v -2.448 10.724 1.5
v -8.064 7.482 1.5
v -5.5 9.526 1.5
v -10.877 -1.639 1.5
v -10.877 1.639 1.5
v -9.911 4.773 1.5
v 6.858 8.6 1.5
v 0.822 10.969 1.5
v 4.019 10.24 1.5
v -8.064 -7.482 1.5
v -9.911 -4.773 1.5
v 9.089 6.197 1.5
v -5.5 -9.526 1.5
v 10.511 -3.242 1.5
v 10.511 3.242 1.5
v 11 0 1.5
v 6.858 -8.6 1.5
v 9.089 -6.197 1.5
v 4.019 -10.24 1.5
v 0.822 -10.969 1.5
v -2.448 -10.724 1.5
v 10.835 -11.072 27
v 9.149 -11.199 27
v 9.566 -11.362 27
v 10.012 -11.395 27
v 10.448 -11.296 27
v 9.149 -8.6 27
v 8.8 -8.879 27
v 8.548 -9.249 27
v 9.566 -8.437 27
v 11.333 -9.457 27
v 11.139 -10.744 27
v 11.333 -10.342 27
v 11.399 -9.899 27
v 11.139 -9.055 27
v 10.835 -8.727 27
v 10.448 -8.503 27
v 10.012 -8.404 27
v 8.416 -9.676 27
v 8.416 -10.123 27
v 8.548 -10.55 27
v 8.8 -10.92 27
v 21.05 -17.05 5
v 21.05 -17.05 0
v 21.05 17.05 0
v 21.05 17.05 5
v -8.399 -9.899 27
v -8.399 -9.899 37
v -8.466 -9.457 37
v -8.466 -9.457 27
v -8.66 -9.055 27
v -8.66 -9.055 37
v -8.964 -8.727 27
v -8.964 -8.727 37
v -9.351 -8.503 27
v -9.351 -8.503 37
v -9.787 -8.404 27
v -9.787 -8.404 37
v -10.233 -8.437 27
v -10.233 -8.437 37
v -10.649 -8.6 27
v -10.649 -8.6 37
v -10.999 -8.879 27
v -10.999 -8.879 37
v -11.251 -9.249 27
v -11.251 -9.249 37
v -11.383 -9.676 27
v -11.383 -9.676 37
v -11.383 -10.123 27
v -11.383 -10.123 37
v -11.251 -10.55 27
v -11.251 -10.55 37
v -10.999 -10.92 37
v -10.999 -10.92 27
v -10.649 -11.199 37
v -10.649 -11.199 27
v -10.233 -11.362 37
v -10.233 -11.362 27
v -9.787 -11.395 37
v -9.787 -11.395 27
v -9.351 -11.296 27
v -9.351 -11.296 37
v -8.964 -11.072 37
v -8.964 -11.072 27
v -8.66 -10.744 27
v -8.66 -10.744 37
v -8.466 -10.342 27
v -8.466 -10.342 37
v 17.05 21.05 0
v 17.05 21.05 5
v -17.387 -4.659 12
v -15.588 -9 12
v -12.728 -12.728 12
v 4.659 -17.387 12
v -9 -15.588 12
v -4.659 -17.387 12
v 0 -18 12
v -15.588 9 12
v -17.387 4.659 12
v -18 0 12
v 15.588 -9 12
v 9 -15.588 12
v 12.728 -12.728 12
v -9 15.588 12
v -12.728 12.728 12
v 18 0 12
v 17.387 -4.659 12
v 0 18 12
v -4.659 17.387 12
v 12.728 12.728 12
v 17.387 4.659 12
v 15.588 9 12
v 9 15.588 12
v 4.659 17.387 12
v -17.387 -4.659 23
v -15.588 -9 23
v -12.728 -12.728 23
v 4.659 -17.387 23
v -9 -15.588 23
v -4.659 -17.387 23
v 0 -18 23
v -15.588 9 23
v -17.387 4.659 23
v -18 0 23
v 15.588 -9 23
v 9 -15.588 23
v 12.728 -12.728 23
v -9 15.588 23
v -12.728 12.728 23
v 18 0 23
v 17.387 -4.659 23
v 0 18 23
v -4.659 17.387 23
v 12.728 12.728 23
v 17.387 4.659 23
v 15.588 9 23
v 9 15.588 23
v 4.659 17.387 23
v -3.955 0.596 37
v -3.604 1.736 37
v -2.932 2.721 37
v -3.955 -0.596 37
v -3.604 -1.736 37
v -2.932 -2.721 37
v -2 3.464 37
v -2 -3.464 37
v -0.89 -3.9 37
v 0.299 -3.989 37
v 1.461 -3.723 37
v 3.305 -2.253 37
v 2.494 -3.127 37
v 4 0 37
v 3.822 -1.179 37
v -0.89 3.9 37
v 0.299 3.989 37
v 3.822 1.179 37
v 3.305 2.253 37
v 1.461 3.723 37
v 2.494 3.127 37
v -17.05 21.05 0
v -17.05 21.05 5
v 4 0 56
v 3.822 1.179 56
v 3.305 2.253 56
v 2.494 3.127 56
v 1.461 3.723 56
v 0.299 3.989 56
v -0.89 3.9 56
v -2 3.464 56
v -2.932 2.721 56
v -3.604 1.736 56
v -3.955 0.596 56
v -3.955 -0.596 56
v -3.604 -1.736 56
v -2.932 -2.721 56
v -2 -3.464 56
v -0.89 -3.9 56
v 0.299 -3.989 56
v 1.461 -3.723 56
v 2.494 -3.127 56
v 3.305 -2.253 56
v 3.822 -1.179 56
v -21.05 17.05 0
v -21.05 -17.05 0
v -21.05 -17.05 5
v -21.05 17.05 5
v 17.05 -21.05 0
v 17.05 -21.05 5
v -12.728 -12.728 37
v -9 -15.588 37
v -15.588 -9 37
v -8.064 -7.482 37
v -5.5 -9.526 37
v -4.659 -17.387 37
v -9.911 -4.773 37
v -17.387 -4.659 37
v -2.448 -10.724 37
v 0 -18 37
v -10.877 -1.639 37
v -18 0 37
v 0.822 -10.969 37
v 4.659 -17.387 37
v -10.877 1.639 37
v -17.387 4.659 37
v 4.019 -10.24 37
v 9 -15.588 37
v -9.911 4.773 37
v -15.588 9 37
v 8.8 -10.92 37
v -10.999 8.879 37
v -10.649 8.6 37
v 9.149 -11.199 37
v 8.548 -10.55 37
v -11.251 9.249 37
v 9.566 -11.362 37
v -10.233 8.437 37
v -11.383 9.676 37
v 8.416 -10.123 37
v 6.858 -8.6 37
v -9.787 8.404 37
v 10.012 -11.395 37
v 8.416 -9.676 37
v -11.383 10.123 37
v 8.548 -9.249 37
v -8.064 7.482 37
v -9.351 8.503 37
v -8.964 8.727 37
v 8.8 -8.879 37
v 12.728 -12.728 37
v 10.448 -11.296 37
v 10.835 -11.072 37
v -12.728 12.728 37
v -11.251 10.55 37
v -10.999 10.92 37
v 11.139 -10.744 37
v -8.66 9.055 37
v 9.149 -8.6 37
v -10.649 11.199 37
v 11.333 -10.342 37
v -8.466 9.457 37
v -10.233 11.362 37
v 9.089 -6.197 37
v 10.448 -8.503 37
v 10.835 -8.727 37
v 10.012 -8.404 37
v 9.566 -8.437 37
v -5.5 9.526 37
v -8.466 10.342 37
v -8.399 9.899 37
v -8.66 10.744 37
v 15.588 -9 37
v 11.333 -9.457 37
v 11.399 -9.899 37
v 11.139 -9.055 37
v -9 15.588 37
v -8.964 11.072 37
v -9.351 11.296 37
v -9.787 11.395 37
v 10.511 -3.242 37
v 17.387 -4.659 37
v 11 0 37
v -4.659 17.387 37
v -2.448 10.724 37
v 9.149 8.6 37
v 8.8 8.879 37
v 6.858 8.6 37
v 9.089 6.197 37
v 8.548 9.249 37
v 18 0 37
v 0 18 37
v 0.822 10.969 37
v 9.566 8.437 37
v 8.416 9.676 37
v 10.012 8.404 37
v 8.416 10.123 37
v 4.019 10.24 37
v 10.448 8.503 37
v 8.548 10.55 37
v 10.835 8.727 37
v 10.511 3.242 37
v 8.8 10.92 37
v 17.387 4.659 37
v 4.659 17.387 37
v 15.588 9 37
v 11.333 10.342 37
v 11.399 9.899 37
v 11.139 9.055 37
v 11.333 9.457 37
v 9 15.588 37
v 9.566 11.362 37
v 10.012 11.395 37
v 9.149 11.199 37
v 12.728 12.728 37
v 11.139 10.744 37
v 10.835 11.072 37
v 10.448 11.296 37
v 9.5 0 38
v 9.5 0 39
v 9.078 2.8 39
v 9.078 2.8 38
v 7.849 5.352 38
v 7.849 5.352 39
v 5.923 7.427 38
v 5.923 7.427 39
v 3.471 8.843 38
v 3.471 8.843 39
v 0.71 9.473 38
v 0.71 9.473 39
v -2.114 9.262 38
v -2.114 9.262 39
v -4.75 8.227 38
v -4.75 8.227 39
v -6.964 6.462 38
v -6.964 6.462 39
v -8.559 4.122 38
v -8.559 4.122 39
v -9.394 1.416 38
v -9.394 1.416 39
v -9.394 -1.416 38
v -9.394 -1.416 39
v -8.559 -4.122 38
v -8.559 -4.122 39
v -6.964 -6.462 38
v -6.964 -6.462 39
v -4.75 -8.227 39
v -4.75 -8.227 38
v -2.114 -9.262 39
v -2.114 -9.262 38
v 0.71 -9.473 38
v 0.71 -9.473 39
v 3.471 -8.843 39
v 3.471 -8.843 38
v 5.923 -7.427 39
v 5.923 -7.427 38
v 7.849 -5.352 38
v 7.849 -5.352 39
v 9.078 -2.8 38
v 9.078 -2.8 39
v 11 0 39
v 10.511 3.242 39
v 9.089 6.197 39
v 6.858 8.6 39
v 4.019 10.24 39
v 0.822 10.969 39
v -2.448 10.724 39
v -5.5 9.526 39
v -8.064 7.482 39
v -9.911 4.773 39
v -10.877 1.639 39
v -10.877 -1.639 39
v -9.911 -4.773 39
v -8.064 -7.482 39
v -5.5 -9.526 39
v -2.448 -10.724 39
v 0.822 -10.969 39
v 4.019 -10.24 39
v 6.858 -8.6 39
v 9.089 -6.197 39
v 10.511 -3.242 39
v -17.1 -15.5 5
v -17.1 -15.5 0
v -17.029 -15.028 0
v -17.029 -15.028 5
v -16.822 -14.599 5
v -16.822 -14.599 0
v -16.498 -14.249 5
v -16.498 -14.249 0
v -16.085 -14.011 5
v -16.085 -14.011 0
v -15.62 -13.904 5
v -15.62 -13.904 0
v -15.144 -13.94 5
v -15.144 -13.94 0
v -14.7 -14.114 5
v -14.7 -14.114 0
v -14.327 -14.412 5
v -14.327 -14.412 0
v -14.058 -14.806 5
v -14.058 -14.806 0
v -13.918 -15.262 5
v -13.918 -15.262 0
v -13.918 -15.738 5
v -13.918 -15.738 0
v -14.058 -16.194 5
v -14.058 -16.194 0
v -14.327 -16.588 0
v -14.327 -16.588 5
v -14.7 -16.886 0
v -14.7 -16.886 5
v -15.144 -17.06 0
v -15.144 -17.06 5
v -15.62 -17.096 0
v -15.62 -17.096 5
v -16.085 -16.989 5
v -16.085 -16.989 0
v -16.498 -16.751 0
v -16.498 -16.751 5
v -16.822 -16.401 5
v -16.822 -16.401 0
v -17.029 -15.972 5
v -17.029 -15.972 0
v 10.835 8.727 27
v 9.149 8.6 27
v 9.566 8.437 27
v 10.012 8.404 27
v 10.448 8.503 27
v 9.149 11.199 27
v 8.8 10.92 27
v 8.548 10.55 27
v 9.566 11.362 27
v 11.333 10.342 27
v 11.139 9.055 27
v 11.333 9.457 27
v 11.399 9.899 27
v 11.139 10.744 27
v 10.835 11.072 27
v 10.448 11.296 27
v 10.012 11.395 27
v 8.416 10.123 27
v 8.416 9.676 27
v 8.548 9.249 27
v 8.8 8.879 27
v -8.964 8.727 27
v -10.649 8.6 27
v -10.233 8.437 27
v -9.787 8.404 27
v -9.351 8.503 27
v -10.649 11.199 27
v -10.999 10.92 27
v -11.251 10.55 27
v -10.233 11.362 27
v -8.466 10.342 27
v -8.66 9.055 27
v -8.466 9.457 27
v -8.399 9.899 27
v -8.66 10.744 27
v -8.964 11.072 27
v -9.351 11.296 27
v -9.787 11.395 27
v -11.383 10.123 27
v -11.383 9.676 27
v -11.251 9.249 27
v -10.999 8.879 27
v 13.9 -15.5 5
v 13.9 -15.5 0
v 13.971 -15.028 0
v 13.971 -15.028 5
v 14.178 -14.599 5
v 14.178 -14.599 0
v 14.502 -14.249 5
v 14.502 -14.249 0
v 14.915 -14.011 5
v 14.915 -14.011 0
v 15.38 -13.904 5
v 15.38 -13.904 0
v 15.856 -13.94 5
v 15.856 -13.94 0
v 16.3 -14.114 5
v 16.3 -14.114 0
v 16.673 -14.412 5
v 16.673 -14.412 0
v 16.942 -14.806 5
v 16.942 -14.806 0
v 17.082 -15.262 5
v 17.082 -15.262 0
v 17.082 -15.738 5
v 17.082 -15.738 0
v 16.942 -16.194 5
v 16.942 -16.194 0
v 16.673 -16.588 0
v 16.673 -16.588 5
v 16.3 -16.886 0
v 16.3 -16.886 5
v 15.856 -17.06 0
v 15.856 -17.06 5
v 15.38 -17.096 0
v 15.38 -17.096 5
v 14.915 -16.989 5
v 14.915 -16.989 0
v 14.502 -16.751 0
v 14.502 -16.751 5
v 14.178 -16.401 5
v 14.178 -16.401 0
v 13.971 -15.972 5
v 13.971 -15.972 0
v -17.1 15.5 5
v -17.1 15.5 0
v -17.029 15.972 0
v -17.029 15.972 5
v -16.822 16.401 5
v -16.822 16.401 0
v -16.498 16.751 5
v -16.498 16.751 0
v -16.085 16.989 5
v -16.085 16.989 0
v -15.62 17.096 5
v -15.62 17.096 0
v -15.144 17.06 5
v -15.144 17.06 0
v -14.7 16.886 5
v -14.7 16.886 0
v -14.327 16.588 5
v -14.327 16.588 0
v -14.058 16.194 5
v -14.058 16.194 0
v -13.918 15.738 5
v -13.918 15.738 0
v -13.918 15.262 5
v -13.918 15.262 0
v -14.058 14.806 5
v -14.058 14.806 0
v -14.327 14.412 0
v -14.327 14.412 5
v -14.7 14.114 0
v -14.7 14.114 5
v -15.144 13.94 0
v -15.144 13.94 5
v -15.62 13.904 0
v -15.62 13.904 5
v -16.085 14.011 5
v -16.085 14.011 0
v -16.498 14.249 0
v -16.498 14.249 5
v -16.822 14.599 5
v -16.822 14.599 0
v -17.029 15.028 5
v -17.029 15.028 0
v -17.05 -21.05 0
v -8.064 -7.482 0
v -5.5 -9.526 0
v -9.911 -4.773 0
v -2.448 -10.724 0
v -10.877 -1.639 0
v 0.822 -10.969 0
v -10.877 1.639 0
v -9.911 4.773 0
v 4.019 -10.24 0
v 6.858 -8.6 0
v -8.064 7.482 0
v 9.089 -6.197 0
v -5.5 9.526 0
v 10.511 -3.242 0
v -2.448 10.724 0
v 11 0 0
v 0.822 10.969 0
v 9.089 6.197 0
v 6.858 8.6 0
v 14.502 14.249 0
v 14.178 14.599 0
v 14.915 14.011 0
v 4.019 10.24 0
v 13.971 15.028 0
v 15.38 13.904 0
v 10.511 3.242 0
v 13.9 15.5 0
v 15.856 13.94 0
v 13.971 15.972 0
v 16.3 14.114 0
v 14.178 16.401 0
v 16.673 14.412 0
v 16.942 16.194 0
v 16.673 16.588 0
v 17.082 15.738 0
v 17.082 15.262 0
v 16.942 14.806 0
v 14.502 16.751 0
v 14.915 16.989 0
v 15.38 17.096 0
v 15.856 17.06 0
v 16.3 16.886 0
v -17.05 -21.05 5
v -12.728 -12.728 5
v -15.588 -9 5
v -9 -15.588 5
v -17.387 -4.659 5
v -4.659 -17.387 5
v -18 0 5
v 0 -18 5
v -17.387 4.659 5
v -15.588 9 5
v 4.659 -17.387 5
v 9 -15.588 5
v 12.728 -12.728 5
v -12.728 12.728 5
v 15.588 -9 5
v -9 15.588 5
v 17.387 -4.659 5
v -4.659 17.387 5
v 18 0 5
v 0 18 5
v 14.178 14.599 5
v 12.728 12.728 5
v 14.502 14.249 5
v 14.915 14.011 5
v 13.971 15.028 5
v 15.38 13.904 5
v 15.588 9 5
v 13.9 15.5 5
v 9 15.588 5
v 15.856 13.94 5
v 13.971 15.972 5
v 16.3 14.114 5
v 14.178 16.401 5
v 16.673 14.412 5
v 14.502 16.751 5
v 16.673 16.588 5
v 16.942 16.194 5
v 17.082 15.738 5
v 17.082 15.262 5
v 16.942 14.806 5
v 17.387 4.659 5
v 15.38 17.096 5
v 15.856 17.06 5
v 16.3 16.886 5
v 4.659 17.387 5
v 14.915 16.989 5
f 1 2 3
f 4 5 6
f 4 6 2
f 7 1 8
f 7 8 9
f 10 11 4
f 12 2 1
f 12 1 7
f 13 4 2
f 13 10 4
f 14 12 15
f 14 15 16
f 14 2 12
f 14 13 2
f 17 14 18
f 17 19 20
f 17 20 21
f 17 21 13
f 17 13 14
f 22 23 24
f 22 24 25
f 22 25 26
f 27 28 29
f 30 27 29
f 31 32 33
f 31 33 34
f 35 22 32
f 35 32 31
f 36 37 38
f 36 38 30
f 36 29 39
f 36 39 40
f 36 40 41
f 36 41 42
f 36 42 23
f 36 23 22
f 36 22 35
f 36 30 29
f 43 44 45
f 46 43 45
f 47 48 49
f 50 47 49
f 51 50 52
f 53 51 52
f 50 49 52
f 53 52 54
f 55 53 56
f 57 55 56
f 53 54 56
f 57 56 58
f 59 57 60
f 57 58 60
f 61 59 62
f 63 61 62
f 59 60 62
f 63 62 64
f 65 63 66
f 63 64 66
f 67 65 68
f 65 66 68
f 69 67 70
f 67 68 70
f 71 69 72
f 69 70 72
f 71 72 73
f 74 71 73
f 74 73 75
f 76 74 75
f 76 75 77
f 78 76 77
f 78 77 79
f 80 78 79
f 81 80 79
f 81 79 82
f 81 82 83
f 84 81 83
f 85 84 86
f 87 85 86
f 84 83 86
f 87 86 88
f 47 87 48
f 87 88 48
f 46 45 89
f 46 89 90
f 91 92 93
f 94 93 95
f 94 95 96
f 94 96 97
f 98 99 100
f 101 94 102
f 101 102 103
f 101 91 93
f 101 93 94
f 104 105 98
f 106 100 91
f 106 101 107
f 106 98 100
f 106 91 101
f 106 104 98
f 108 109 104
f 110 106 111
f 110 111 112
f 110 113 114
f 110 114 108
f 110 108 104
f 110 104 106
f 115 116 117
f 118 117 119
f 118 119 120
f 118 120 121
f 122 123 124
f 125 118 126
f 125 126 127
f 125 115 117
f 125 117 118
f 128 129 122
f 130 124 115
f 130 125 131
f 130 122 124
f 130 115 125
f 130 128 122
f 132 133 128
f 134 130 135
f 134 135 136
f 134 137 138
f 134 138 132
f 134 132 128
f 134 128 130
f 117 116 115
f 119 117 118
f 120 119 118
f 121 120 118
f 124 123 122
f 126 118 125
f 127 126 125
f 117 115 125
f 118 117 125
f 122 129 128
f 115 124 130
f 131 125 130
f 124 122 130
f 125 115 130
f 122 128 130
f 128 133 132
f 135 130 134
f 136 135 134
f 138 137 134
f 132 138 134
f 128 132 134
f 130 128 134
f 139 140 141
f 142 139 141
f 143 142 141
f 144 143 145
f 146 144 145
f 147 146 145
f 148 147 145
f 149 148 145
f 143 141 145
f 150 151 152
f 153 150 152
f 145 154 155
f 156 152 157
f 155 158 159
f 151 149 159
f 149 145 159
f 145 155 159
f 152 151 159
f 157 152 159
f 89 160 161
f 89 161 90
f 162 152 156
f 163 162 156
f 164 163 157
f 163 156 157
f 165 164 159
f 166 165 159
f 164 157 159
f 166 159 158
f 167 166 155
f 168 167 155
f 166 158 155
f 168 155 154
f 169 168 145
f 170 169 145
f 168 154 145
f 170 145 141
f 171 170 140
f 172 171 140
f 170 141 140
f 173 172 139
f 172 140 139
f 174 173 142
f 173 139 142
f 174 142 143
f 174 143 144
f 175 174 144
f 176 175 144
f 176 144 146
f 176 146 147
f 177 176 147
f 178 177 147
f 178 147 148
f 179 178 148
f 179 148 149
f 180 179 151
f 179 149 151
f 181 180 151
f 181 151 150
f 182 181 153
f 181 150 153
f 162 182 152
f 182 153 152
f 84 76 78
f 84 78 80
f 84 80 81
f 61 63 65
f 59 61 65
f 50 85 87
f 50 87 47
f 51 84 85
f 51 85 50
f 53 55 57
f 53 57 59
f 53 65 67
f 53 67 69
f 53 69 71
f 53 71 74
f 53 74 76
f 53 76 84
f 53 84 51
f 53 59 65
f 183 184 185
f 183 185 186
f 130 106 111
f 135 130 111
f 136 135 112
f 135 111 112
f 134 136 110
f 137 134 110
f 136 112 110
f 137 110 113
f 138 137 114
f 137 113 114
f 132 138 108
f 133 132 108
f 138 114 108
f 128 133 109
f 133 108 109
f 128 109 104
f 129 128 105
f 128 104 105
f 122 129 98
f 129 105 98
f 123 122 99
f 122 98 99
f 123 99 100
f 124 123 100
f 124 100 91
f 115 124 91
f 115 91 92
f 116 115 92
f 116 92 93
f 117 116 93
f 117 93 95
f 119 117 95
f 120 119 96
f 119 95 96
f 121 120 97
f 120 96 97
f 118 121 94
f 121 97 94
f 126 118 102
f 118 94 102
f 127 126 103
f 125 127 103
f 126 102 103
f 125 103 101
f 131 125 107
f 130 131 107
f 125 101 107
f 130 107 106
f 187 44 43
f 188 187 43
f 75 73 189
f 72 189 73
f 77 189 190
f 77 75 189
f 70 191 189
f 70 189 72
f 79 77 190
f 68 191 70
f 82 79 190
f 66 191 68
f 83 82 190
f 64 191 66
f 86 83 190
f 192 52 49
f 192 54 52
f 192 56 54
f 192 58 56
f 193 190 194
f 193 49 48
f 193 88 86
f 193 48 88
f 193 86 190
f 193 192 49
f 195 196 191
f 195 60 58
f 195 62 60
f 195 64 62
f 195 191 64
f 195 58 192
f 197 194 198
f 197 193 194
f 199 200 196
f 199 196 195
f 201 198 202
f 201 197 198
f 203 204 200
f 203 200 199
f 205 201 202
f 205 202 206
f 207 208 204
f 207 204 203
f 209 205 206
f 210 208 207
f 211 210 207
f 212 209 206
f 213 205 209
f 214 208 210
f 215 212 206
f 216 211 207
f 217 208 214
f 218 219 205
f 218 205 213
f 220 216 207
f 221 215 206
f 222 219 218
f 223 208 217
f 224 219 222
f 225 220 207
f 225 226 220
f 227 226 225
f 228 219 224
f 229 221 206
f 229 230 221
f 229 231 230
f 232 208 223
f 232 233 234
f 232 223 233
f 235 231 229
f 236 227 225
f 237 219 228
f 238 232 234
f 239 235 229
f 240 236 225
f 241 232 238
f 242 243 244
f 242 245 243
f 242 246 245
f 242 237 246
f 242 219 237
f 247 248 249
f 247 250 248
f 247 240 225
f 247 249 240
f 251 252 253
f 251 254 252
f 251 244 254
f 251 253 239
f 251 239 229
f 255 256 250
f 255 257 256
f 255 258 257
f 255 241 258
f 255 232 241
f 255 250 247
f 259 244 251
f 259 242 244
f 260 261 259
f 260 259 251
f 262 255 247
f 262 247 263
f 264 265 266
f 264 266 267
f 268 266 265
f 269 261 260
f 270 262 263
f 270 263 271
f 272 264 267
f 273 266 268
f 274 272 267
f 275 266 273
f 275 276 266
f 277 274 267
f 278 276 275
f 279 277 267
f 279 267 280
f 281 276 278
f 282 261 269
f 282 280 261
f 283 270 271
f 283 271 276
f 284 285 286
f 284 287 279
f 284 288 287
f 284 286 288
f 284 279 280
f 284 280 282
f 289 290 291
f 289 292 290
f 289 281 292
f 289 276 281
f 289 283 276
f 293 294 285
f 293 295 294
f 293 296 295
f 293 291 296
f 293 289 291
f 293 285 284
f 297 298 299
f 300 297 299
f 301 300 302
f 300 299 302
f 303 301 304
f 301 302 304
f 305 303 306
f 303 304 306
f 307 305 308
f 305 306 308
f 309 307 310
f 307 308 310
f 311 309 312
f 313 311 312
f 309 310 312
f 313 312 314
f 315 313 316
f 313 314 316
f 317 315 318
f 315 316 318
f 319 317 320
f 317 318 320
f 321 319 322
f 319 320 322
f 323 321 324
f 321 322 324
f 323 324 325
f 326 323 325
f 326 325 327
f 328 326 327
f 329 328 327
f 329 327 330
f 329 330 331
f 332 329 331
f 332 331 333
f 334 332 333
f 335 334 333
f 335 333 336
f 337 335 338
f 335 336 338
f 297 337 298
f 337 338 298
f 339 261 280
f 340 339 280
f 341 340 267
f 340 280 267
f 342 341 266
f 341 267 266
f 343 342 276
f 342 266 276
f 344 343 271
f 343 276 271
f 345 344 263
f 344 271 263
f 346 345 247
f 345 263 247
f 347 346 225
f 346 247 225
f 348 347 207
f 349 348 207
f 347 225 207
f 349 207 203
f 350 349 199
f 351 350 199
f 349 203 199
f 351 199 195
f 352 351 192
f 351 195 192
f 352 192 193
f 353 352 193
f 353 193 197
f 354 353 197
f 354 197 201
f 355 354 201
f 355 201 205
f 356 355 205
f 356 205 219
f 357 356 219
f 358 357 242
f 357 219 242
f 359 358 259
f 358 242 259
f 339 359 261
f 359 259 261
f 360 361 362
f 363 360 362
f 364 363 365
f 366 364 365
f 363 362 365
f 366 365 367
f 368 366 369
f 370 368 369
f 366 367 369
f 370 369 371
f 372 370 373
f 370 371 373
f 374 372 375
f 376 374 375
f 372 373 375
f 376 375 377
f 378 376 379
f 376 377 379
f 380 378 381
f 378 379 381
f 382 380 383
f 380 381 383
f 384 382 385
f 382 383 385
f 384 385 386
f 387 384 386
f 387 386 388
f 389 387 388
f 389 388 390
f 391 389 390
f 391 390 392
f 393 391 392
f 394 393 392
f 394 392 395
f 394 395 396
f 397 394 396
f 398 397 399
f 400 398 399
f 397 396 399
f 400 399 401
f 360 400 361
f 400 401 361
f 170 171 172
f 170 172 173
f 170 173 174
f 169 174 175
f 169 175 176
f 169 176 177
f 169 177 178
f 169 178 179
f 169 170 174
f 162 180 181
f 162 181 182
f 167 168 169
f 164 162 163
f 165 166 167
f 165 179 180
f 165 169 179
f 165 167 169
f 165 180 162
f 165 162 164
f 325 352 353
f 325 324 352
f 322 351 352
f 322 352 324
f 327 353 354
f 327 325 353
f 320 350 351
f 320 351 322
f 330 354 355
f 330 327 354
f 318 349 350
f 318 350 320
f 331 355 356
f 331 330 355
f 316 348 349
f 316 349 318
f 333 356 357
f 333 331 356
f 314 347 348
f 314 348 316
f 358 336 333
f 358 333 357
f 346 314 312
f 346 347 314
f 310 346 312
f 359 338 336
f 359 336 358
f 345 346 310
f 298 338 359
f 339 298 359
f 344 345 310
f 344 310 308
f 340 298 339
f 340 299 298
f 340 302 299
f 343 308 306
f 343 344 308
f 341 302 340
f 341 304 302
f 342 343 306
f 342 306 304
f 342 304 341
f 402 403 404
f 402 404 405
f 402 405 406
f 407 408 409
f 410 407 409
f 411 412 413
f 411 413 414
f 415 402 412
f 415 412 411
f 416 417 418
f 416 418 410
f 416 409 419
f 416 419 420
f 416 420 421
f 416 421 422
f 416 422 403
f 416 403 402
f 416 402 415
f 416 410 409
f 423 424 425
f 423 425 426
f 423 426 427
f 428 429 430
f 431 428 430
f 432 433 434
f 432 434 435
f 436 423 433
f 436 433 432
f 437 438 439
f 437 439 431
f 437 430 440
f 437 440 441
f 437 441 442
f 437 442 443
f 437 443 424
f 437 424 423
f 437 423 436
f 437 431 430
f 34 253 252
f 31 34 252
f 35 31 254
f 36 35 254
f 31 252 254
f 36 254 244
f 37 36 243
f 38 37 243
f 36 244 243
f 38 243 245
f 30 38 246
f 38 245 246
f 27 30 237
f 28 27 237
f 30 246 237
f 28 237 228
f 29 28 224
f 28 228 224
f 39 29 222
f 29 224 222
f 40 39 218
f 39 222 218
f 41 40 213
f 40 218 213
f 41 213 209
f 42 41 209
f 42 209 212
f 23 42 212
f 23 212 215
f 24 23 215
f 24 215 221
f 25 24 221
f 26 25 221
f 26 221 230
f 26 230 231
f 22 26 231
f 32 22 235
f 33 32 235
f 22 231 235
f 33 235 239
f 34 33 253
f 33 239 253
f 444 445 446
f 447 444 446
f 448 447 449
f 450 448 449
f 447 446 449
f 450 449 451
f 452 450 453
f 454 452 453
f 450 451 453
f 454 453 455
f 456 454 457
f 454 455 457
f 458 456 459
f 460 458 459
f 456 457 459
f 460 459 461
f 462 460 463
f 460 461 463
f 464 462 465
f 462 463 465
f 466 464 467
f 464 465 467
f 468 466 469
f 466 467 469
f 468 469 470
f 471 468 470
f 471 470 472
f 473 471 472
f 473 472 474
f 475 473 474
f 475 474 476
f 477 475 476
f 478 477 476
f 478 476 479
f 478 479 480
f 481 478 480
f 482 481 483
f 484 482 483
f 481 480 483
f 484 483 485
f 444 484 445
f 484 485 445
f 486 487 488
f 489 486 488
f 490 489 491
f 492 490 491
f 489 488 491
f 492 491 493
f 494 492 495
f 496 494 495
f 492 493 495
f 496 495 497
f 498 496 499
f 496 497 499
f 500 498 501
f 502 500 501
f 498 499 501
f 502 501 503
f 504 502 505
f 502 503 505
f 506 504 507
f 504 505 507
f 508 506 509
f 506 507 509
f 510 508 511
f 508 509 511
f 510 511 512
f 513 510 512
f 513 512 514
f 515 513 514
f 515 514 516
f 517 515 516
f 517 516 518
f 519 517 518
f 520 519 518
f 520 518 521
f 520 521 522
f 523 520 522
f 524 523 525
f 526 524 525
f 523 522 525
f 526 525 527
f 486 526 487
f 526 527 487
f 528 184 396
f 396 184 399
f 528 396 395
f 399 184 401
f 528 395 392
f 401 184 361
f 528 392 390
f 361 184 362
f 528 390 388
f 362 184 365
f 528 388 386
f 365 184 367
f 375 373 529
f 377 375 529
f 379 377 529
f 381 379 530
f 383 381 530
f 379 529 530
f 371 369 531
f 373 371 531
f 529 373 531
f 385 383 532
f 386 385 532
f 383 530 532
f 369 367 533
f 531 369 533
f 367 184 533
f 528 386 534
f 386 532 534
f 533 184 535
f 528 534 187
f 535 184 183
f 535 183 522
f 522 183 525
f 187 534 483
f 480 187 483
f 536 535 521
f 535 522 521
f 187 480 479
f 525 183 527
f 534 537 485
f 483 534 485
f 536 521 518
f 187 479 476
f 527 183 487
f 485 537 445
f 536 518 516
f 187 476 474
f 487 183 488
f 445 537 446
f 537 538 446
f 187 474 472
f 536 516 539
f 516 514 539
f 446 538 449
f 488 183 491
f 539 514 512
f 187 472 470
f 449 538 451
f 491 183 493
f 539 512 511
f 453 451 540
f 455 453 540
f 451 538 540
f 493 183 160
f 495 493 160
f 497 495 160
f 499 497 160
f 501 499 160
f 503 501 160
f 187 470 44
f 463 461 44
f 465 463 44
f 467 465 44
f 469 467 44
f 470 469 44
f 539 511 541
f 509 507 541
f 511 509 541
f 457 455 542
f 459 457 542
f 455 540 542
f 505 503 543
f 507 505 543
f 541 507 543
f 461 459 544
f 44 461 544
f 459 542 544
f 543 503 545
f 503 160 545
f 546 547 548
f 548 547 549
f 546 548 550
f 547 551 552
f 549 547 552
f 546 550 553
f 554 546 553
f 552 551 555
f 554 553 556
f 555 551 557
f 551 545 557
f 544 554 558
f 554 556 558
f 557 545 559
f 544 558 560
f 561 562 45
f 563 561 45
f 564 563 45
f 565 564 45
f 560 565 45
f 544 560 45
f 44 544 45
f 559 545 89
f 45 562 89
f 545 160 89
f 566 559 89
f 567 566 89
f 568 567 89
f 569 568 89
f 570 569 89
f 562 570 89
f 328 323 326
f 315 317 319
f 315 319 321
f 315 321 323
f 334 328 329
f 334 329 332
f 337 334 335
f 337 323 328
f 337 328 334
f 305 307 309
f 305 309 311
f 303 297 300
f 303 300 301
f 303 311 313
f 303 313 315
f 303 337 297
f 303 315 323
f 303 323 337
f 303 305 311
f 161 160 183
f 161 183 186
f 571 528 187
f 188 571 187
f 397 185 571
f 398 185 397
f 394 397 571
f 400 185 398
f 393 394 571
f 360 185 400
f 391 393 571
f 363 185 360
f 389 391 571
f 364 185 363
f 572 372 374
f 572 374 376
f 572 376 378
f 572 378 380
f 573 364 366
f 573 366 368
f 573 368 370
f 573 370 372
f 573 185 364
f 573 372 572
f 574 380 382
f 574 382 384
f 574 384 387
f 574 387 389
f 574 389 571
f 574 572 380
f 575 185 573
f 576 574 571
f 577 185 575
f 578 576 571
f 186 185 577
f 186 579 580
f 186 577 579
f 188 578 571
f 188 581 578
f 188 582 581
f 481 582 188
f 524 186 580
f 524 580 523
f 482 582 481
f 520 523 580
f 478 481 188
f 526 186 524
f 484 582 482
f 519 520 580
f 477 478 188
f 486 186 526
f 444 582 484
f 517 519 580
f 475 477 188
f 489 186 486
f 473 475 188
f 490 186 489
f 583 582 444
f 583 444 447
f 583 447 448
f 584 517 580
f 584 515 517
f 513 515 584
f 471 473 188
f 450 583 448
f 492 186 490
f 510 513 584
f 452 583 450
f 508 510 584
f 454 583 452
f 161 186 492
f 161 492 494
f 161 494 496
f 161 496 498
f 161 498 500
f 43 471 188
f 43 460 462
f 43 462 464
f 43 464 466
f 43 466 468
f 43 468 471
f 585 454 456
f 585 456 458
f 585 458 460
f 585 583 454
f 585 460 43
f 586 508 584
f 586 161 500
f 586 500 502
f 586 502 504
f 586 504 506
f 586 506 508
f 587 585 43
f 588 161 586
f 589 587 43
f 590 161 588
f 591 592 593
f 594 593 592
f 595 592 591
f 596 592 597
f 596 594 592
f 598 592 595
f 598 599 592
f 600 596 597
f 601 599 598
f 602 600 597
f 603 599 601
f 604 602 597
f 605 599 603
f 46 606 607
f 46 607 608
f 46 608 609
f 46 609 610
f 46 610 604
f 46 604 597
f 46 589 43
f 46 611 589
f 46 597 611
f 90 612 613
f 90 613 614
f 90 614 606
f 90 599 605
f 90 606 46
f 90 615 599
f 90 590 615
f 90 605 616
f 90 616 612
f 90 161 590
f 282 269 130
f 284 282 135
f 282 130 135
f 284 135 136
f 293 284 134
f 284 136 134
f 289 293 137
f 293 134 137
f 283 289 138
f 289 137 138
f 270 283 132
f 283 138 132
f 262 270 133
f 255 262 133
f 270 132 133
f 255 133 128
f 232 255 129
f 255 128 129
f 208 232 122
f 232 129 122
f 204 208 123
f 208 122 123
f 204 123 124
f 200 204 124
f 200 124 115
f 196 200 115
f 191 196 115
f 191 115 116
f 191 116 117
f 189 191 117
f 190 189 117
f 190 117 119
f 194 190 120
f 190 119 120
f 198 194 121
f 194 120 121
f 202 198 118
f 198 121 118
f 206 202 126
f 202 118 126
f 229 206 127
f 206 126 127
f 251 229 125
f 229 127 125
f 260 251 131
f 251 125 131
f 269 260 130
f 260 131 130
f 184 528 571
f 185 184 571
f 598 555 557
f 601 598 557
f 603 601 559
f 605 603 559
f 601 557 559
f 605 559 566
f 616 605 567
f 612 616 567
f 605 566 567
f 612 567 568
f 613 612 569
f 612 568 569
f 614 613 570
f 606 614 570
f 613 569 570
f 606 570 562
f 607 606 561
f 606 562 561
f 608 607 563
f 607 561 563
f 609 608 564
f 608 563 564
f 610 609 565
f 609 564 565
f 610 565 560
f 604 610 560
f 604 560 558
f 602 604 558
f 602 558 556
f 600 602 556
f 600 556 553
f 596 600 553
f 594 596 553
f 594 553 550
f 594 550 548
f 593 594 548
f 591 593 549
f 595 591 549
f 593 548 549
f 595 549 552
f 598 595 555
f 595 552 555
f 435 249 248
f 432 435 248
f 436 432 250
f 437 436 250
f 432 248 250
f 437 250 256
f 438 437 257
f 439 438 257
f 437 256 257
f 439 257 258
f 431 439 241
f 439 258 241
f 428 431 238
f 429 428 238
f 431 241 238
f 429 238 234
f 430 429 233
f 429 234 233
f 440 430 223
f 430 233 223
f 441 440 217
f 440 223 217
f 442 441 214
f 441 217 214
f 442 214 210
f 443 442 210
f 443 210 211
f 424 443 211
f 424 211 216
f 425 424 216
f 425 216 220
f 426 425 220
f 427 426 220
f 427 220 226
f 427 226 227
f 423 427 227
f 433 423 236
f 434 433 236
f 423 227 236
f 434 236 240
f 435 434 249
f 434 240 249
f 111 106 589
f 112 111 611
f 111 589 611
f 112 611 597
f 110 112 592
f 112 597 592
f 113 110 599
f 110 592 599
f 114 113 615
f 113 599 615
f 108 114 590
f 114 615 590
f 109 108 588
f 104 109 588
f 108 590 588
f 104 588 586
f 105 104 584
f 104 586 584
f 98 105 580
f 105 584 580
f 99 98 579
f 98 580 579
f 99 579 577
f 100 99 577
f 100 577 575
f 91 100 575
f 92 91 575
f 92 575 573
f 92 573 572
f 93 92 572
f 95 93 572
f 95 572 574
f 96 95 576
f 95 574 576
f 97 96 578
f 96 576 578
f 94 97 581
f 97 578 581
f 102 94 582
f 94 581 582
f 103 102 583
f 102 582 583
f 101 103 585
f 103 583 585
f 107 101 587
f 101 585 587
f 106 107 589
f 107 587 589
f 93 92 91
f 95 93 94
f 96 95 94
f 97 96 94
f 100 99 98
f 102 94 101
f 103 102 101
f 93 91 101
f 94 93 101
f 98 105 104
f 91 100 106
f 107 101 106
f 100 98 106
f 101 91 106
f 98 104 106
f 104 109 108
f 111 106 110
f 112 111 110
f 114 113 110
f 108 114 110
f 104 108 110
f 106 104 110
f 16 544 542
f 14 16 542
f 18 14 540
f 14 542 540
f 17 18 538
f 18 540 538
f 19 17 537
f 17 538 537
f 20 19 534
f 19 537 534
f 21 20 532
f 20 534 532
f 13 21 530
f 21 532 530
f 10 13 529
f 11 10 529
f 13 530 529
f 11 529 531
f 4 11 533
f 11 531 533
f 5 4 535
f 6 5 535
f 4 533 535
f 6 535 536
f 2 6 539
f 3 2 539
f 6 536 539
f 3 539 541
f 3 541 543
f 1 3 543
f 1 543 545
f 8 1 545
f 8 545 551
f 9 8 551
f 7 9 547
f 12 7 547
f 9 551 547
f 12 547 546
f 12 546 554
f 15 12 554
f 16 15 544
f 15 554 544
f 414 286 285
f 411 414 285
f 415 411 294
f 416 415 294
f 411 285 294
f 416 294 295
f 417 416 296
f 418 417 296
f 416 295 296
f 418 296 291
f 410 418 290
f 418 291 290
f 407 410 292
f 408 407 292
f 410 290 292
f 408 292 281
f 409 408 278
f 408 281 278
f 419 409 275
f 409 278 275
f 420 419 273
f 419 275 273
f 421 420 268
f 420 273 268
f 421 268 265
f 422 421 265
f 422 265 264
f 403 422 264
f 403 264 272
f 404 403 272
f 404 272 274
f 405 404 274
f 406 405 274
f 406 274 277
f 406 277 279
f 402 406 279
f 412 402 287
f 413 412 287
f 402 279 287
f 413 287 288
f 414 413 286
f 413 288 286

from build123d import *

# Parameters (mm, degrees)
SKETCH1_W           = 42.1
SKETCH1_H           = 42.1
BOSS_EXTRUDE2_DEPTH = 5
SKETCH3_R           = 18
BOSS_EXTRUDE3_DEPTH = 7
SKETCH4_R           = 18
BOSS_EXTRUDE4_DEPTH = 11
SKETCH5_R           = 18
BOSS_EXTRUDE5_DEPTH = 14
SKETCH6_R           = 11
BOSS_EXTRUDE6_DEPTH = 2
SKETCH9_R           = 9.5
CUT_EXTRUDE2_DEPTH  = 1
SKETCH7_R           = 4
BOSS_EXTRUDE7_DEPTH = 19
SKETCH10_R          = 1.6
CUT_EXTRUDE3_DEPTH  = 5
SKETCH12_R          = 1.5
CUT_EXTRUDE5_DEPTH  = 10
CHAMFER1_SIZE       = 4
SKETCH15_R          = 11
CUT_EXTRUDE8_DEPTH  = 1.5


with BuildPart() as part:
    # Sketch1 → Boss-Extrude2 (new body)
    with BuildSketch(Plane.XY):
        Rectangle(SKETCH1_W, SKETCH1_H)
    extrude(amount=BOSS_EXTRUDE2_DEPTH)

    # Sketch3 → Boss-Extrude3 (add)
    with BuildSketch(Plane.XY.offset(5)):
        Circle(SKETCH3_R)
    extrude(amount=BOSS_EXTRUDE3_DEPTH)

    # Sketch10 → Cut-Extrude3 (cut)
    with BuildSketch(Plane(origin=(0, 0, 0), x_dir=(-1, 0, 0), z_dir=(0, 0, -1))):
        with Locations((-15.5, 15.5)):
            Circle(SKETCH10_R)
        with Locations((15.5, 15.5)):
            Circle(SKETCH10_R)
        with Locations((15.5, -15.5)):
            Circle(SKETCH10_R)
        with Locations((-15.5, -15.5)):
            Circle(SKETCH10_R)
    extrude(amount=-CUT_EXTRUDE3_DEPTH, mode=Mode.SUBTRACT)

    # Chamfer1
    chamfer1_edges = [part.edges().sort_by_distance(p)[0] for p in [
        (-21.05, 21.05, 2.5),
        (21.05, 21.05, 2.5),
        (21.05, -21.05, 2.5),
        (-21.05, -21.05, 2.5),
    ]]
    chamfer(chamfer1_edges, length=CHAMFER1_SIZE)

    # Sketch15 → Cut-Extrude8 (cut)
    with BuildSketch(Plane(origin=(0, 0, 0), x_dir=(-1, 0, 0), z_dir=(0, 0, -1))):
        with Locations(Location((0, 0, 0), (0, 0, 180))):
            Circle(SKETCH15_R)
    extrude(amount=-CUT_EXTRUDE8_DEPTH, mode=Mode.SUBTRACT)


with BuildPart() as body_2:
    # Sketch4 → Boss-Extrude4 (new body)
    with BuildSketch(Plane.XY.offset(12)):
        Circle(SKETCH4_R)
    extrude(amount=BOSS_EXTRUDE4_DEPTH)


with BuildPart() as body_3:
    # Sketch5 → Boss-Extrude5 (new body)
    with BuildSketch(Plane.XY.offset(23)):
        Circle(SKETCH5_R)
    extrude(amount=BOSS_EXTRUDE5_DEPTH)

    # Sketch6 → Boss-Extrude6 (add)
    with BuildSketch(Plane.XY.offset(37)):
        Circle(SKETCH6_R)
    extrude(amount=BOSS_EXTRUDE6_DEPTH)

    # Sketch9 → Cut-Extrude2 (cut)
    with BuildSketch(Plane.XY.offset(39)):
        Circle(SKETCH9_R)
    extrude(amount=-CUT_EXTRUDE2_DEPTH, mode=Mode.SUBTRACT)

    # Sketch12 → Cut-Extrude5 (cut)
    with BuildSketch(Plane.XY.offset(37)):
        with Locations((-9.899494937, 9.899494937)):
            Circle(SKETCH12_R)
        with Locations((9.899494937, 9.899494937)):
            Circle(SKETCH12_R)
        with Locations((9.899494937, -9.899494937)):
            Circle(SKETCH12_R)
        with Locations((-9.899494937, -9.899494937)):
            Circle(SKETCH12_R)
    extrude(amount=-CUT_EXTRUDE5_DEPTH, mode=Mode.SUBTRACT)


with BuildPart() as body_4:
    # Sketch7 → Boss-Extrude7 (new body)
    with BuildSketch(Plane.XY.offset(37)):
        Circle(SKETCH7_R)
    extrude(amount=BOSS_EXTRUDE7_DEPTH)


solid = Compound([part.part, body_2.part, body_3.part, body_4.part])
